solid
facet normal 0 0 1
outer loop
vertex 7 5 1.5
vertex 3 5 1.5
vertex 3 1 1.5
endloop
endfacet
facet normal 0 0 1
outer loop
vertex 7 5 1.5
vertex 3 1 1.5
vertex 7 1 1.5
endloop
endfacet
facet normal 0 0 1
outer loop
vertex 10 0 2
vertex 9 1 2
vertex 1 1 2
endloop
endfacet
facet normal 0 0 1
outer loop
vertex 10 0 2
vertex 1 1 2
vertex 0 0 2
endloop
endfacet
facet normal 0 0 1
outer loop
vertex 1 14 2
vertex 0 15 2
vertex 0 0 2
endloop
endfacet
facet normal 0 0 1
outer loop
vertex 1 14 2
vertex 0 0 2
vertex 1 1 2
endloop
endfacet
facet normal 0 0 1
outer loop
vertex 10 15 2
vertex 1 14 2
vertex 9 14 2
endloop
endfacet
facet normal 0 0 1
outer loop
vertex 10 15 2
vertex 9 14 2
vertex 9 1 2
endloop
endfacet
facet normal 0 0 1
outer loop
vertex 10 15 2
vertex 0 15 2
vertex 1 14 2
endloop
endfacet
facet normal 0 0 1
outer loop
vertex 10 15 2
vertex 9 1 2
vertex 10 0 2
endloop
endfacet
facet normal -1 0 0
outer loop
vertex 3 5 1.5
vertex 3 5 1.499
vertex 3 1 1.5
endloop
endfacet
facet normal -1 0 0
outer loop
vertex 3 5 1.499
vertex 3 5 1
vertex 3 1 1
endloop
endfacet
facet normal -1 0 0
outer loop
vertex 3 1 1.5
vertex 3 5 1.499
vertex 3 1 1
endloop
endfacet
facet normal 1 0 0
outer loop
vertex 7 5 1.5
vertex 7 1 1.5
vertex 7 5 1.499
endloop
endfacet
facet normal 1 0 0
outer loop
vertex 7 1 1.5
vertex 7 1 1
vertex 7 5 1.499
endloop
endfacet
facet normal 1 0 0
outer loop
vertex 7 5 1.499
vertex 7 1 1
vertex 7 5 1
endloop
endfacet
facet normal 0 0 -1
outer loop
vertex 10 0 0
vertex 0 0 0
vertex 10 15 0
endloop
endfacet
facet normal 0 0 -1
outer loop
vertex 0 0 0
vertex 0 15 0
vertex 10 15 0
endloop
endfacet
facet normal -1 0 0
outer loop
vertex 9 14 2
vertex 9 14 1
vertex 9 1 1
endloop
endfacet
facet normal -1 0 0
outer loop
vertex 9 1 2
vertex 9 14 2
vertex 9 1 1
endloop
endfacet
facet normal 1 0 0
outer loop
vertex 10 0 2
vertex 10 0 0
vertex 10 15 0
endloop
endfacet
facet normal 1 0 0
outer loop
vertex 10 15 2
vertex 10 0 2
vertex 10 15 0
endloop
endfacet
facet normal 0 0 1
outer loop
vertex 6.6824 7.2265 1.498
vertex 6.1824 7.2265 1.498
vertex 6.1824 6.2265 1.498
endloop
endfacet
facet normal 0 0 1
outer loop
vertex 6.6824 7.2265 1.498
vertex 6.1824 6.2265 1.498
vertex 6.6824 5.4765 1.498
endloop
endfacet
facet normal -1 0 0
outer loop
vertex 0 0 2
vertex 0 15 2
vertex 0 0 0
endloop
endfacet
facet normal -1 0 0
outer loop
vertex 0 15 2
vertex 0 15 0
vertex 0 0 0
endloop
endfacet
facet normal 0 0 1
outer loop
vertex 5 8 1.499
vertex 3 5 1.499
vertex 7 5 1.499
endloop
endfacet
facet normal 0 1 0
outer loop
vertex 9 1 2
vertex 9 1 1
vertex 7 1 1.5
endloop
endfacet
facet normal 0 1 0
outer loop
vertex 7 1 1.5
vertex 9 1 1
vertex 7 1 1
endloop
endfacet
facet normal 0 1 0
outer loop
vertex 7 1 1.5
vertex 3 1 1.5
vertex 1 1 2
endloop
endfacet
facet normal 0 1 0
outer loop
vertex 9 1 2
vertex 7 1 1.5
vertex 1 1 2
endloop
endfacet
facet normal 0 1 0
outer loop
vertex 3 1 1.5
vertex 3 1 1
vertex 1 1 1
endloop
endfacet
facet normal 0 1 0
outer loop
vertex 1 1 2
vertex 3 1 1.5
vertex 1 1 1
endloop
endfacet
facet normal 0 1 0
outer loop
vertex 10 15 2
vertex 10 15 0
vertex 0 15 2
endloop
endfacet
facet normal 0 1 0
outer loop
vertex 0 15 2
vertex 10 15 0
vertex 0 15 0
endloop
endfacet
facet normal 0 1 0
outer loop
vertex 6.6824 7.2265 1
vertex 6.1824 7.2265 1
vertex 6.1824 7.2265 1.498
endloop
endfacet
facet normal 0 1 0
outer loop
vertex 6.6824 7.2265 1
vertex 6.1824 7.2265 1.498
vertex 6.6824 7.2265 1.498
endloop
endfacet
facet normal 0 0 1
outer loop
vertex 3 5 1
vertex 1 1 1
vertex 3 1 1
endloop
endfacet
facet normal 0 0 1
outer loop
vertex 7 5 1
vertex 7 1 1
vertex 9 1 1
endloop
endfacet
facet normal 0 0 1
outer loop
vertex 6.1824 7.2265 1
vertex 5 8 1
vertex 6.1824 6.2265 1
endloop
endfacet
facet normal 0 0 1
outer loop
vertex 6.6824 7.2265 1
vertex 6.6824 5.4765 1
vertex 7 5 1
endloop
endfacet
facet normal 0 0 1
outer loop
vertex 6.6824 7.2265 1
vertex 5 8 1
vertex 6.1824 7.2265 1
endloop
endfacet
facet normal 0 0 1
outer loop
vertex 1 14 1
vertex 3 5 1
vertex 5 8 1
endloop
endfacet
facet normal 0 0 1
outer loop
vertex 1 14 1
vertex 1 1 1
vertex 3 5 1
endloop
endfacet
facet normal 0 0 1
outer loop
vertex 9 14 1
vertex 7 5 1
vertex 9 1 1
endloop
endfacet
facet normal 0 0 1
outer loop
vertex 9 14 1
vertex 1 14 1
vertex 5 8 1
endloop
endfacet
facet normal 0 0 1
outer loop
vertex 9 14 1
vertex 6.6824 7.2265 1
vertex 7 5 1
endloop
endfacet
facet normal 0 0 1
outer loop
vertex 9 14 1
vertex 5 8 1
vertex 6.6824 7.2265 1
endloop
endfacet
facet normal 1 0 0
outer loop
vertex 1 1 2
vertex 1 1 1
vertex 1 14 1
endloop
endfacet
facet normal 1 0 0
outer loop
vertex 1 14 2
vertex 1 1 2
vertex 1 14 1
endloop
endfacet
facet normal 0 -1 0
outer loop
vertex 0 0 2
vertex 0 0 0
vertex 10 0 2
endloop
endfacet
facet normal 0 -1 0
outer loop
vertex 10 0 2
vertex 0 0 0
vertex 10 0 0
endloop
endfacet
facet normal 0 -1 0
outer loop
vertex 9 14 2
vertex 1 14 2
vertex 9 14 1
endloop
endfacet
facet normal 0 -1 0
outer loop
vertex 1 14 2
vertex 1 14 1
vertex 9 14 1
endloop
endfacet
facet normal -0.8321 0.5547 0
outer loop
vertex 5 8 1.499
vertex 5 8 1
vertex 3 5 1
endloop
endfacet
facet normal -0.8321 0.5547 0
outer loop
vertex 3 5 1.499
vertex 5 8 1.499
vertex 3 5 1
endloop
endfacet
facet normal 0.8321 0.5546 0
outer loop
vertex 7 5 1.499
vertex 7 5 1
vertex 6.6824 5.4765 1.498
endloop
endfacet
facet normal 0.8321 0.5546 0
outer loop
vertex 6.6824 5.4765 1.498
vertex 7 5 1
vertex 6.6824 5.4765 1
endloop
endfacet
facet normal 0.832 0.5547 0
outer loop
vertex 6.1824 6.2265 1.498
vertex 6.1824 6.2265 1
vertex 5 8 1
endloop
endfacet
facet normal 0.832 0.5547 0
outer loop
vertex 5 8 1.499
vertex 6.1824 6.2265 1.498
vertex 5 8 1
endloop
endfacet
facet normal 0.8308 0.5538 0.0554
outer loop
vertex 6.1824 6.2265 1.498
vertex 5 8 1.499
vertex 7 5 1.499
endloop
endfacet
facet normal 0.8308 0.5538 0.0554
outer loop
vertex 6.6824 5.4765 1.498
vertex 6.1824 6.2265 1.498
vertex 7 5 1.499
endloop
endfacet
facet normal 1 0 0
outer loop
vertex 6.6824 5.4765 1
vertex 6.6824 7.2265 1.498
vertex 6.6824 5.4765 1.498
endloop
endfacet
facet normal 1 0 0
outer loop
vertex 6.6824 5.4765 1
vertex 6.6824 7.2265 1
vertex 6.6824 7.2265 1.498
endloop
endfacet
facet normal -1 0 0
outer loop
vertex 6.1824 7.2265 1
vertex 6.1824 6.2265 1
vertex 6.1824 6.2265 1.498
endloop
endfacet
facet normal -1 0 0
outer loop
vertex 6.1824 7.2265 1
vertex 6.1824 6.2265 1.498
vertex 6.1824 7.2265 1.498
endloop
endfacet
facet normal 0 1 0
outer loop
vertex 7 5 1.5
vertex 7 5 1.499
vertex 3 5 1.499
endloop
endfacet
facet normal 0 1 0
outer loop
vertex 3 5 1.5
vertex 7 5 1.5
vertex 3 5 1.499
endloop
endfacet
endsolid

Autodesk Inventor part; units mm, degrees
ref_plane "YZ Plane" through (0, 0, 0) normal (1, 0, 0) x (0, 1, 0)
ref_plane "XZ Plane" through (0, 0, 0) normal (0, 1, 0) x (-1, 0, 0)
ref_plane "XY Plane" through (0, 0, 0) normal (0, 0, 1) x (1, 0, 0)
sketch "Sketch1" plane through (0, 0, 0) normal (0, 0, 1) x (1, 0, 0)
  line L0 (0, 0) -> (10, 0)
  line L1 (10, 0) -> (10, 15)
  line L2 (10, 15) -> (0, 15)
  line L3 (0, 15) -> (0, 0)
  line L4 (9, 1) -> (1, 1)
  line L5 (1, 1) -> (1, 14)
  line L6 (1, 14) -> (9, 14)
  line L7 (9, 14) -> (9, 1)
  dimension "d0" = 10
  dimension "d1" = 15
  dimension "d2" = 1
extrude "Extrusion1" add sketch "Sketch1" along normal blind 1 contours L4 L5 L6 L7
sketch "Sketch2" plane through (0, 0, 0) normal (0, 0, -1) x (-1, 0, 0)
  line L0 (-1, 1) -> (-9, 1) projected
  line L1 (-9, 14) -> (-1, 14) projected
  line L2 (-9, 1) -> (-1, 1)
  line L3 (-1, 1) -> (-1, 14)
  line L4 (-1, 14) -> (-9, 14)
  line L5 (-9, 14) -> (-9, 1)
  point P0 (0, 0)
extrude "Extrusion2" add sketch "Sketch1" along normal blind 2
sketch "Sketch3" plane through (0, 0, 1) normal (0, 0, 1) x (1, 0, 0)
  line L0 (9, 1) -> (1, 1) projected
  line L1 (3, 1) -> (7, 1)
  line L2 (7, 1) -> (7, 5)
  line L3 (7, 5) -> (3, 5)
  line L4 (3, 5) -> (3, 1)
  line L5 (9, 14) -> (9, 1) projected
  line L6 (3, 5) -> (7, 5)
  line L7 (7, 5) -> (5, 8)
  line L8 (5, 8) -> (3, 5)
  line L9 (6.1824, 6.2265) -> (6.1824, 7.2265)
  line L10 (6.1824, 7.2265) -> (6.6824, 7.2265)
  line L11 (6.6824, 7.2265) -> (6.6824, 5.4765)
  point P0 (0, 0)
  dimension "d7" = 4
  dimension "d8" = 4
  dimension "d9" = 2
  dimension "d10" = 3
  dimension "d11" = 1
  dimension "d12" = 0.5
extrude "Extrusion3" add sketch "Sketch3" along normal blind 0.5 contours L0 L4 L3 L2
extrude "Extrusion4" add sketch "Sketch3" along normal blind 0.499 contours L3 L8 L7
extrude "Extrusion5" add sketch "Sketch3" along normal blind 0.498 contours L7 L9 L10 L11
properties part number "Painting"
